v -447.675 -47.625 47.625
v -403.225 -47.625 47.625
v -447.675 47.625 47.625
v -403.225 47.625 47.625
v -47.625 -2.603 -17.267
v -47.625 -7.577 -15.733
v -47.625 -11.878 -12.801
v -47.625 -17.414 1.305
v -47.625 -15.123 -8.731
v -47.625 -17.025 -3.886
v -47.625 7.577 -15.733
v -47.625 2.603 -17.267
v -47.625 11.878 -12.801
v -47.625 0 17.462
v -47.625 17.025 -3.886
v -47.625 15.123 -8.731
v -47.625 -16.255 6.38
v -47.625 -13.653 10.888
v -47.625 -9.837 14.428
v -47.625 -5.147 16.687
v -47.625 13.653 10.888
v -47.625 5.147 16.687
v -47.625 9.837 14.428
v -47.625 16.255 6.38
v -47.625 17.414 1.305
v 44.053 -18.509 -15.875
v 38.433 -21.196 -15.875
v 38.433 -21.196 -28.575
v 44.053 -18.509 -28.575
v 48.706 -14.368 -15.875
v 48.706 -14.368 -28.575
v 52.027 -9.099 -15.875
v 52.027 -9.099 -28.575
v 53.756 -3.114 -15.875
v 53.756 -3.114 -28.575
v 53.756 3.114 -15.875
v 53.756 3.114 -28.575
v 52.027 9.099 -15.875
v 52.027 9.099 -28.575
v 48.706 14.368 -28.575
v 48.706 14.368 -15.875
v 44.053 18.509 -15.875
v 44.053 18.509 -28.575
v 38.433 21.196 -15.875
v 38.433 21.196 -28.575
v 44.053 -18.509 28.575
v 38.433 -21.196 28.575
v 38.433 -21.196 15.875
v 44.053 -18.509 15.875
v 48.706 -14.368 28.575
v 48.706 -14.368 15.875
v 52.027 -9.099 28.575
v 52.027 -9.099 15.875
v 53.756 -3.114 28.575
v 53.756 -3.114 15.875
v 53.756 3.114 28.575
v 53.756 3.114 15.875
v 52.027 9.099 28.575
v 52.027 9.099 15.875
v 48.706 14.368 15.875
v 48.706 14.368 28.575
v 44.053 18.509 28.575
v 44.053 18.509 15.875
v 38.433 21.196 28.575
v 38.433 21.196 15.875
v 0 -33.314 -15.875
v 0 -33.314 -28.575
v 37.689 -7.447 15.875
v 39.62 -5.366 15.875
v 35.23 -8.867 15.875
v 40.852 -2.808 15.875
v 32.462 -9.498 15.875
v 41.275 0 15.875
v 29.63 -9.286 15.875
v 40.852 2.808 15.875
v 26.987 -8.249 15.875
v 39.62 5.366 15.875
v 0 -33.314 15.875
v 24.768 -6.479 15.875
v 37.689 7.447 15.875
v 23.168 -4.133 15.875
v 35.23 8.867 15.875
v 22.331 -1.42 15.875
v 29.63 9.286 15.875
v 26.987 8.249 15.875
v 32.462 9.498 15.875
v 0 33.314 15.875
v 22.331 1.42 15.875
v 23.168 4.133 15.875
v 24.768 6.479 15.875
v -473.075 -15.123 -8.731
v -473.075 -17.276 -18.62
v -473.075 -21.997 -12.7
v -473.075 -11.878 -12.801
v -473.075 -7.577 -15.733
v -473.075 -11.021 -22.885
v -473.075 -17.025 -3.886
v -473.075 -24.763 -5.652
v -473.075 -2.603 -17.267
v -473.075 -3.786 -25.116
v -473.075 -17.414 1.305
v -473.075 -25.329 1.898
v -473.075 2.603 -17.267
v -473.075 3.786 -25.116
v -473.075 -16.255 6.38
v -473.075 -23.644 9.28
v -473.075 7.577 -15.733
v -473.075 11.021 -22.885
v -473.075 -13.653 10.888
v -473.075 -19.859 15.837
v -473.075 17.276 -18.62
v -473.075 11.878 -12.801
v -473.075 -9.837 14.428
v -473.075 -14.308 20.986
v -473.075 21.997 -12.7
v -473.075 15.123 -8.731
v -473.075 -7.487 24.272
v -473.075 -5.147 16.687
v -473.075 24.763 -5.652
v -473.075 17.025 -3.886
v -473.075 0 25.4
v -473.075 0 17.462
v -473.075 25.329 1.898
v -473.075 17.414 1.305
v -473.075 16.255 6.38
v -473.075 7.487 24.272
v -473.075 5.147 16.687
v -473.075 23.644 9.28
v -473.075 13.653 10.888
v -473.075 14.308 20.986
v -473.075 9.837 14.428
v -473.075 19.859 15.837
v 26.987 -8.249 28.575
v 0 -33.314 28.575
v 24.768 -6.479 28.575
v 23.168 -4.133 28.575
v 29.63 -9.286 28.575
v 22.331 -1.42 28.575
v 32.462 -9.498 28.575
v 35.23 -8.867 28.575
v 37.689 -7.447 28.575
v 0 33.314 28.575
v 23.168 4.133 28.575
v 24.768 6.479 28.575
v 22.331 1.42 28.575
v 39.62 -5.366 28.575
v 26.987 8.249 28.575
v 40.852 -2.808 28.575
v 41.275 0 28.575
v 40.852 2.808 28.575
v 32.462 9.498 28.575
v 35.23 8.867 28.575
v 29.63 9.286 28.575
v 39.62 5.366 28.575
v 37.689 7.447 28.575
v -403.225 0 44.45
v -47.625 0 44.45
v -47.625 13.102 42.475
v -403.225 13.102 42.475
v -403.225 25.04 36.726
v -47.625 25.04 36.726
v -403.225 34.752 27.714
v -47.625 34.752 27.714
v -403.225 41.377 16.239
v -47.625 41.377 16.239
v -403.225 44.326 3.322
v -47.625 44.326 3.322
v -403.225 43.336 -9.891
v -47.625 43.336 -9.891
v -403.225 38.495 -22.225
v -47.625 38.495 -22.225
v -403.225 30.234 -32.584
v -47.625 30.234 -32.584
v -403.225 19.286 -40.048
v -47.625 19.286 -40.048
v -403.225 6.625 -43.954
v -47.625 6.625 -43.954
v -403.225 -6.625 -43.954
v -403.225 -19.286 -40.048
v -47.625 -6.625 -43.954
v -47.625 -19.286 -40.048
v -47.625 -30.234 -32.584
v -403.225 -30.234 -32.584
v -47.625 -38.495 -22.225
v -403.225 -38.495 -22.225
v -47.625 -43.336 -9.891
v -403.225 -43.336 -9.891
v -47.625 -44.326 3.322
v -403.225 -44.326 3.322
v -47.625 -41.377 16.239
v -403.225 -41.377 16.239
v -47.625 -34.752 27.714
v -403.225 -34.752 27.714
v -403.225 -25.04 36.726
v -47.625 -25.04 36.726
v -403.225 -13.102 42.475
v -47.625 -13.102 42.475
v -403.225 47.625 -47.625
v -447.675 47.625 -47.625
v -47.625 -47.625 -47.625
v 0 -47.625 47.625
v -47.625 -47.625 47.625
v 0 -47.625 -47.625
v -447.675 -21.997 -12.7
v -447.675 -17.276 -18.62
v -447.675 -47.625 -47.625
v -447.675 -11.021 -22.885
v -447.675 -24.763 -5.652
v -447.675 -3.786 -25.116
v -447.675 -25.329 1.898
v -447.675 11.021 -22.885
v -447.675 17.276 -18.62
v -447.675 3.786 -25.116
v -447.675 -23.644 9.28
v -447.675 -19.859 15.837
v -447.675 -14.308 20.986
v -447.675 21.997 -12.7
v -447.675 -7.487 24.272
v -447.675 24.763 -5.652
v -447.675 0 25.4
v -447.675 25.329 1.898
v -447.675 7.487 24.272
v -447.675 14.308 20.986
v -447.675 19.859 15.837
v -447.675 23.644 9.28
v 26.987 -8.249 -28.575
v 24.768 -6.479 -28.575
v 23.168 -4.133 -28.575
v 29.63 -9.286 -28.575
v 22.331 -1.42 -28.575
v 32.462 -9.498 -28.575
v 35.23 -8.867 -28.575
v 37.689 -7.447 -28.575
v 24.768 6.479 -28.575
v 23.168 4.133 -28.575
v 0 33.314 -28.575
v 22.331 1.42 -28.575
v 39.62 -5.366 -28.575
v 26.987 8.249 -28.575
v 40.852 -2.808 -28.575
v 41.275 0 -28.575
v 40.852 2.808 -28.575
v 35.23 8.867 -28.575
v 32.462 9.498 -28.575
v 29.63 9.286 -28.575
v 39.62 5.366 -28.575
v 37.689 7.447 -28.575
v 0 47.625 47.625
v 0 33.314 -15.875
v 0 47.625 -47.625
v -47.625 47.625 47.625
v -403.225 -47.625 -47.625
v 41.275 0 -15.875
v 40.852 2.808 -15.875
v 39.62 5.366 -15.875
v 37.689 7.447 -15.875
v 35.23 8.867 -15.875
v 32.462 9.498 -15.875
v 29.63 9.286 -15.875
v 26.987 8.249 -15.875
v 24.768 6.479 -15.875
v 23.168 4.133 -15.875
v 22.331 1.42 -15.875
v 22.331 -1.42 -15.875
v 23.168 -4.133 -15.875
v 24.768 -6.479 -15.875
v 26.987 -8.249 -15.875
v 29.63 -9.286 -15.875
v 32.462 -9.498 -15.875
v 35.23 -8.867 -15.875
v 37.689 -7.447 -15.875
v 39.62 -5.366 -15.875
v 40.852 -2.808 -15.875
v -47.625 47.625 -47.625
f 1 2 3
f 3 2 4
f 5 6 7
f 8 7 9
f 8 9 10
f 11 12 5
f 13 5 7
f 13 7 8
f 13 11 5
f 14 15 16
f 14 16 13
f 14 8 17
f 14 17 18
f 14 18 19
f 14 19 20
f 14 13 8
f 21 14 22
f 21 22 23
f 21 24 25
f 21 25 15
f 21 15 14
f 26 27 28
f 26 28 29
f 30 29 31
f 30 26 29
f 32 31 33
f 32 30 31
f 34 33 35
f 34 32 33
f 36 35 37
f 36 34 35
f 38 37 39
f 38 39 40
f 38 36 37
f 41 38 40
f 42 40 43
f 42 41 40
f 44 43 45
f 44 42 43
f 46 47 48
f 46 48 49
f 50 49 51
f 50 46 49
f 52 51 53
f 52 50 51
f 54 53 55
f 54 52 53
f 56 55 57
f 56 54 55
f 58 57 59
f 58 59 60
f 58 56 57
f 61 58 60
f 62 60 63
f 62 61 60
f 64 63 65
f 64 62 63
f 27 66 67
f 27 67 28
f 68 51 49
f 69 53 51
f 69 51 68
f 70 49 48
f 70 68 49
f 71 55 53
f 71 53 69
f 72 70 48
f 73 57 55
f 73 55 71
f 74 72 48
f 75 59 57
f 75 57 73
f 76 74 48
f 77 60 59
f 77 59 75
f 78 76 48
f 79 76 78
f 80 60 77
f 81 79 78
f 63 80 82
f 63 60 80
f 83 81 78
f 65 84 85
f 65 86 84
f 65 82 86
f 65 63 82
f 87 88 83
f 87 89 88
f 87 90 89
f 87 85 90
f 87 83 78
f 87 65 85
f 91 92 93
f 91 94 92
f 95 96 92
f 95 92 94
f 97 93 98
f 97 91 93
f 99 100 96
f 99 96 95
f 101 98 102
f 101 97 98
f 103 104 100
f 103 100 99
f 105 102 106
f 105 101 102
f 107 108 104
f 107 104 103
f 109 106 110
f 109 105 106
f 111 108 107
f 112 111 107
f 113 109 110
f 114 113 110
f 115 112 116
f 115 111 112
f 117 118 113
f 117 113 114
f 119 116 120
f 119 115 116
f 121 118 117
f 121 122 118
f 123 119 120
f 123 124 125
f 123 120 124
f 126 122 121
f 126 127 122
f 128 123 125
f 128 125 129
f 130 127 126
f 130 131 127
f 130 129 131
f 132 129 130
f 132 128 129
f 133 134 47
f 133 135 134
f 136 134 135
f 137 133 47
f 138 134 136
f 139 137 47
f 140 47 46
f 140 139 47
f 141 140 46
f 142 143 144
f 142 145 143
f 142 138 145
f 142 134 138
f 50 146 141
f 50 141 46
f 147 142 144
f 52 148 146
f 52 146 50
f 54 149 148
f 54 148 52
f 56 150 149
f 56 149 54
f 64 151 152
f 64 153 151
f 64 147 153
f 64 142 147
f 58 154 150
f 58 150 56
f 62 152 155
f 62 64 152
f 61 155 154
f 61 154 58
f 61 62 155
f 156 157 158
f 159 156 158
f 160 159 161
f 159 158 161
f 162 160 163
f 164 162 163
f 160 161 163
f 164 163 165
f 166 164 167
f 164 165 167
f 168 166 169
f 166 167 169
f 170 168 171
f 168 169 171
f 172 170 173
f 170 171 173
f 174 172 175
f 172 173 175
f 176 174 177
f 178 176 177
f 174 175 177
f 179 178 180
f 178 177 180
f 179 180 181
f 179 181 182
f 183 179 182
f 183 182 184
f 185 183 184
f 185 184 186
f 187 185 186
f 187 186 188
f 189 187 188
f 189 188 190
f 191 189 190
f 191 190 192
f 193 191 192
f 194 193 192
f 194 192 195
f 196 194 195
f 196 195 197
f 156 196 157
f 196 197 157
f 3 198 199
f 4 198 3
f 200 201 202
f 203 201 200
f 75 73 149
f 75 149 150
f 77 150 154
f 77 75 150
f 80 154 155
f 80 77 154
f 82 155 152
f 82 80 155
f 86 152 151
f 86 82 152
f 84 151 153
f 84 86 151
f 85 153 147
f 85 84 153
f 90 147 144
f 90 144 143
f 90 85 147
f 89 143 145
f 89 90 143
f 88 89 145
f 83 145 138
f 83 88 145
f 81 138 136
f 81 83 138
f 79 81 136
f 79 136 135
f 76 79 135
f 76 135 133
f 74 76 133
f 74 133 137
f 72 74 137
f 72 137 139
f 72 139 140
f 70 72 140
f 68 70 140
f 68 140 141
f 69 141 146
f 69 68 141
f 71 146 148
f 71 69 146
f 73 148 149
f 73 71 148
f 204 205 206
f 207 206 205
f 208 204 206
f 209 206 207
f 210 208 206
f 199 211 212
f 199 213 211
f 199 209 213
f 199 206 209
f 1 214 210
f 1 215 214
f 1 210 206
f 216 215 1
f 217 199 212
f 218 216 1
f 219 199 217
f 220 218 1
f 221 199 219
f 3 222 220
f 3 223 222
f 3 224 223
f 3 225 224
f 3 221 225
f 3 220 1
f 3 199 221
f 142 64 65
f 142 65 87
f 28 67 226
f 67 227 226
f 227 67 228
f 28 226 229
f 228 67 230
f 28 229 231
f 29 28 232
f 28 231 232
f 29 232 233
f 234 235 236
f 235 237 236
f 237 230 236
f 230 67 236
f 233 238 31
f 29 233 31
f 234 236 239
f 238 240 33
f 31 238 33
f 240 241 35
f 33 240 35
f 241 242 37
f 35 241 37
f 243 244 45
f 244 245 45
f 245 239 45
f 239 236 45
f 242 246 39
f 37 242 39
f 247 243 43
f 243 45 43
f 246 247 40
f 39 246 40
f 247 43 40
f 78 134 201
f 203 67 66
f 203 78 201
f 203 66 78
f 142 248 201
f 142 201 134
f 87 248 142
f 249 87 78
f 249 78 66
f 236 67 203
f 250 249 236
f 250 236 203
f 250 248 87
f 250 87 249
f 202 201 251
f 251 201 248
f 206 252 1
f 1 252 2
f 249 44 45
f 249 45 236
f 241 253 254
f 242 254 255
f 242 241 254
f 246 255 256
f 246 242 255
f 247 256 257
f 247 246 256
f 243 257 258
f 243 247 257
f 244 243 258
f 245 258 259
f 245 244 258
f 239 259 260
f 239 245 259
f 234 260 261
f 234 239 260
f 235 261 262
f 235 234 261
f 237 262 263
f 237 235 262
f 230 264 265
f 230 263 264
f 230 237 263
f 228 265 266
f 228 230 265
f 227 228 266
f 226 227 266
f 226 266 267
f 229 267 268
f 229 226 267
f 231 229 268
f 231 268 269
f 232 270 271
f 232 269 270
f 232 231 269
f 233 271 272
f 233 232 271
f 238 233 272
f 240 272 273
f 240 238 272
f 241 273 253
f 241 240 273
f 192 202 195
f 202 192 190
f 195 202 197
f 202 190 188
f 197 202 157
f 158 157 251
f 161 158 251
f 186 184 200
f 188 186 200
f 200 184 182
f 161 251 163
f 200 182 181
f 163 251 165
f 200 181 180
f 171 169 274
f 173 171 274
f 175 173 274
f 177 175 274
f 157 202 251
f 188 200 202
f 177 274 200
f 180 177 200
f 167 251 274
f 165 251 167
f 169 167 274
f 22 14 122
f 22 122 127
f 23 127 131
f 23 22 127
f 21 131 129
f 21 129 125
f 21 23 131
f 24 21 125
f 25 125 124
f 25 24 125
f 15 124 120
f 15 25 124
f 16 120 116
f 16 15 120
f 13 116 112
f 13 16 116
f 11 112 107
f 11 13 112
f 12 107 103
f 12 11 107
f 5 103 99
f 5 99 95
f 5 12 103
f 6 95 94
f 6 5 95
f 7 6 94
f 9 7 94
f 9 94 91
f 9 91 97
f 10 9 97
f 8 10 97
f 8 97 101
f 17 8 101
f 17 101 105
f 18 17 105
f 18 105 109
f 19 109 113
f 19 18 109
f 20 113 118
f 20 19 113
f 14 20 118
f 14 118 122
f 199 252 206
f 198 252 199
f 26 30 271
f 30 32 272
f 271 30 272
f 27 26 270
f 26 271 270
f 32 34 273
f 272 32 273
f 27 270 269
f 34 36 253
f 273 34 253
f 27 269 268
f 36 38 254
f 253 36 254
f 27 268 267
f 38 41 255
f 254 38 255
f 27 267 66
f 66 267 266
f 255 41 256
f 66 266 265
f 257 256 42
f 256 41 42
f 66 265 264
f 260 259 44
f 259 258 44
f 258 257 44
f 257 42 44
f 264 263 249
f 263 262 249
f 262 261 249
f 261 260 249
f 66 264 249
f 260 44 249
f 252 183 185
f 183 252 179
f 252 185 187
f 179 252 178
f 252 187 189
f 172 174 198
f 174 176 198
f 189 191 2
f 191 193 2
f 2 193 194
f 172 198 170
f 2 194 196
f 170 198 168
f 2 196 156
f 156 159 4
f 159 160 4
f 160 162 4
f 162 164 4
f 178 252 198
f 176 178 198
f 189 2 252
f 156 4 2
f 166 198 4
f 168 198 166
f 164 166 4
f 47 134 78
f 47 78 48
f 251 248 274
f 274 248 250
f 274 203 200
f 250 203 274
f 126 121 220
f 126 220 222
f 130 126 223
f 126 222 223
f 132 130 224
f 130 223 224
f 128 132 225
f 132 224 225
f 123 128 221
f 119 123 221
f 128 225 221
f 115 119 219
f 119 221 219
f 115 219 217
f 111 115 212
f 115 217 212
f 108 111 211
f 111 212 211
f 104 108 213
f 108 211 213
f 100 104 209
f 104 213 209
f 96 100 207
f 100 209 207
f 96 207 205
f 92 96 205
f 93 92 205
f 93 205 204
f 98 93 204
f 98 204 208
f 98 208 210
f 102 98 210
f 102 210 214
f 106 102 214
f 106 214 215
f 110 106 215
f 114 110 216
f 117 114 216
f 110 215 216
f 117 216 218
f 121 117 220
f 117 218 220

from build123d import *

# Parameters (mm, degrees)
SKETCH1_W           = 95.25
SKETCH1_H           = 95.25
BASE_EXTRUDE_DEPTH  = 47.625
SKETCH2_R           = 44.45
BOSS_EXTRUDE1_DEPTH = 355.6
SKETCH3_W           = 95.25
SKETCH3_H           = 95.25
BOSS_EXTRUDE2_DEPTH = 44.45
SKETCH4_R           = 25.4
BOSS_EXTRUDE3_DEPTH = 25.4
CUT_EXTRUDE1_START  = -425.45
SKETCH5_R           = 17.4625
CUT_EXTRUDE1_DEPTH  = 425.45
SKETCH6_R           = 9.525
BOSS_EXTRUDE4_DEPTH = 28.575
SKETCH7_W           = 53.975
SKETCH7_H           = 31.75
CUT_EXTRUDE2_DEPTH  = 485.913042462


with BuildPart() as part:
    # Sketch1 → Base-Extrude (new body)
    with BuildSketch(Plane(origin=(0, 0, 0), x_dir=(0, 0, -1), z_dir=(1, 0, 0))):
        Rectangle(SKETCH1_W, SKETCH1_H)
    extrude(amount=-BASE_EXTRUDE_DEPTH)

    # Sketch2 → Boss-Extrude1 (add)
    with BuildSketch(Plane.ZY.offset(47.625)):
        Circle(SKETCH2_R)
    extrude(amount=BOSS_EXTRUDE1_DEPTH)

    # Sketch3 → Boss-Extrude2 (add)
    with BuildSketch(Plane.ZY.offset(403.225)):
        Rectangle(SKETCH3_W, SKETCH3_H)
    extrude(amount=BOSS_EXTRUDE2_DEPTH)

    # Sketch4 → Boss-Extrude3 (add)
    with BuildSketch(Plane.ZY.offset(447.675)):
        Circle(SKETCH4_R)
    extrude(amount=BOSS_EXTRUDE3_DEPTH)

    # Sketch5 → Cut-Extrude1 (cut)
    with BuildSketch(Plane.ZY.offset(473.075).offset(CUT_EXTRUDE1_START)):
        Circle(SKETCH5_R)
    extrude(amount=CUT_EXTRUDE1_DEPTH, mode=Mode.SUBTRACT)

    # Sketch6 → Boss-Extrude4 (add, symmetric)
    with BuildSketch(Plane.XY):
        with BuildLine():
            Line((38.433186394, 21.19635923), (0, 33.314296353))
            Line((0, 33.314296353), (0, -33.314296353))
            Line((0, -33.314296353), (38.433186394, -21.19635923))
            ThreePointArc((38.433186394, -21.19635923), (53.975, 0), (38.433186394, 21.19635923))
        make_face()
        with Locations((31.75, 0)):
            Circle(SKETCH6_R, mode=Mode.SUBTRACT)
    extrude(amount=BOSS_EXTRUDE4_DEPTH, both=True)

    # Sketch7 → Cut-Extrude2 (cut, through all)
    with BuildSketch(Plane(origin=(0, 47.625, 0), x_dir=(-1, 0, 0), z_dir=(0, 1, 0))):
        with Locations((-26.9875, 0)):
            Rectangle(SKETCH7_W, SKETCH7_H)
    extrude(amount=-CUT_EXTRUDE2_DEPTH, mode=Mode.SUBTRACT)


solid = part.part
